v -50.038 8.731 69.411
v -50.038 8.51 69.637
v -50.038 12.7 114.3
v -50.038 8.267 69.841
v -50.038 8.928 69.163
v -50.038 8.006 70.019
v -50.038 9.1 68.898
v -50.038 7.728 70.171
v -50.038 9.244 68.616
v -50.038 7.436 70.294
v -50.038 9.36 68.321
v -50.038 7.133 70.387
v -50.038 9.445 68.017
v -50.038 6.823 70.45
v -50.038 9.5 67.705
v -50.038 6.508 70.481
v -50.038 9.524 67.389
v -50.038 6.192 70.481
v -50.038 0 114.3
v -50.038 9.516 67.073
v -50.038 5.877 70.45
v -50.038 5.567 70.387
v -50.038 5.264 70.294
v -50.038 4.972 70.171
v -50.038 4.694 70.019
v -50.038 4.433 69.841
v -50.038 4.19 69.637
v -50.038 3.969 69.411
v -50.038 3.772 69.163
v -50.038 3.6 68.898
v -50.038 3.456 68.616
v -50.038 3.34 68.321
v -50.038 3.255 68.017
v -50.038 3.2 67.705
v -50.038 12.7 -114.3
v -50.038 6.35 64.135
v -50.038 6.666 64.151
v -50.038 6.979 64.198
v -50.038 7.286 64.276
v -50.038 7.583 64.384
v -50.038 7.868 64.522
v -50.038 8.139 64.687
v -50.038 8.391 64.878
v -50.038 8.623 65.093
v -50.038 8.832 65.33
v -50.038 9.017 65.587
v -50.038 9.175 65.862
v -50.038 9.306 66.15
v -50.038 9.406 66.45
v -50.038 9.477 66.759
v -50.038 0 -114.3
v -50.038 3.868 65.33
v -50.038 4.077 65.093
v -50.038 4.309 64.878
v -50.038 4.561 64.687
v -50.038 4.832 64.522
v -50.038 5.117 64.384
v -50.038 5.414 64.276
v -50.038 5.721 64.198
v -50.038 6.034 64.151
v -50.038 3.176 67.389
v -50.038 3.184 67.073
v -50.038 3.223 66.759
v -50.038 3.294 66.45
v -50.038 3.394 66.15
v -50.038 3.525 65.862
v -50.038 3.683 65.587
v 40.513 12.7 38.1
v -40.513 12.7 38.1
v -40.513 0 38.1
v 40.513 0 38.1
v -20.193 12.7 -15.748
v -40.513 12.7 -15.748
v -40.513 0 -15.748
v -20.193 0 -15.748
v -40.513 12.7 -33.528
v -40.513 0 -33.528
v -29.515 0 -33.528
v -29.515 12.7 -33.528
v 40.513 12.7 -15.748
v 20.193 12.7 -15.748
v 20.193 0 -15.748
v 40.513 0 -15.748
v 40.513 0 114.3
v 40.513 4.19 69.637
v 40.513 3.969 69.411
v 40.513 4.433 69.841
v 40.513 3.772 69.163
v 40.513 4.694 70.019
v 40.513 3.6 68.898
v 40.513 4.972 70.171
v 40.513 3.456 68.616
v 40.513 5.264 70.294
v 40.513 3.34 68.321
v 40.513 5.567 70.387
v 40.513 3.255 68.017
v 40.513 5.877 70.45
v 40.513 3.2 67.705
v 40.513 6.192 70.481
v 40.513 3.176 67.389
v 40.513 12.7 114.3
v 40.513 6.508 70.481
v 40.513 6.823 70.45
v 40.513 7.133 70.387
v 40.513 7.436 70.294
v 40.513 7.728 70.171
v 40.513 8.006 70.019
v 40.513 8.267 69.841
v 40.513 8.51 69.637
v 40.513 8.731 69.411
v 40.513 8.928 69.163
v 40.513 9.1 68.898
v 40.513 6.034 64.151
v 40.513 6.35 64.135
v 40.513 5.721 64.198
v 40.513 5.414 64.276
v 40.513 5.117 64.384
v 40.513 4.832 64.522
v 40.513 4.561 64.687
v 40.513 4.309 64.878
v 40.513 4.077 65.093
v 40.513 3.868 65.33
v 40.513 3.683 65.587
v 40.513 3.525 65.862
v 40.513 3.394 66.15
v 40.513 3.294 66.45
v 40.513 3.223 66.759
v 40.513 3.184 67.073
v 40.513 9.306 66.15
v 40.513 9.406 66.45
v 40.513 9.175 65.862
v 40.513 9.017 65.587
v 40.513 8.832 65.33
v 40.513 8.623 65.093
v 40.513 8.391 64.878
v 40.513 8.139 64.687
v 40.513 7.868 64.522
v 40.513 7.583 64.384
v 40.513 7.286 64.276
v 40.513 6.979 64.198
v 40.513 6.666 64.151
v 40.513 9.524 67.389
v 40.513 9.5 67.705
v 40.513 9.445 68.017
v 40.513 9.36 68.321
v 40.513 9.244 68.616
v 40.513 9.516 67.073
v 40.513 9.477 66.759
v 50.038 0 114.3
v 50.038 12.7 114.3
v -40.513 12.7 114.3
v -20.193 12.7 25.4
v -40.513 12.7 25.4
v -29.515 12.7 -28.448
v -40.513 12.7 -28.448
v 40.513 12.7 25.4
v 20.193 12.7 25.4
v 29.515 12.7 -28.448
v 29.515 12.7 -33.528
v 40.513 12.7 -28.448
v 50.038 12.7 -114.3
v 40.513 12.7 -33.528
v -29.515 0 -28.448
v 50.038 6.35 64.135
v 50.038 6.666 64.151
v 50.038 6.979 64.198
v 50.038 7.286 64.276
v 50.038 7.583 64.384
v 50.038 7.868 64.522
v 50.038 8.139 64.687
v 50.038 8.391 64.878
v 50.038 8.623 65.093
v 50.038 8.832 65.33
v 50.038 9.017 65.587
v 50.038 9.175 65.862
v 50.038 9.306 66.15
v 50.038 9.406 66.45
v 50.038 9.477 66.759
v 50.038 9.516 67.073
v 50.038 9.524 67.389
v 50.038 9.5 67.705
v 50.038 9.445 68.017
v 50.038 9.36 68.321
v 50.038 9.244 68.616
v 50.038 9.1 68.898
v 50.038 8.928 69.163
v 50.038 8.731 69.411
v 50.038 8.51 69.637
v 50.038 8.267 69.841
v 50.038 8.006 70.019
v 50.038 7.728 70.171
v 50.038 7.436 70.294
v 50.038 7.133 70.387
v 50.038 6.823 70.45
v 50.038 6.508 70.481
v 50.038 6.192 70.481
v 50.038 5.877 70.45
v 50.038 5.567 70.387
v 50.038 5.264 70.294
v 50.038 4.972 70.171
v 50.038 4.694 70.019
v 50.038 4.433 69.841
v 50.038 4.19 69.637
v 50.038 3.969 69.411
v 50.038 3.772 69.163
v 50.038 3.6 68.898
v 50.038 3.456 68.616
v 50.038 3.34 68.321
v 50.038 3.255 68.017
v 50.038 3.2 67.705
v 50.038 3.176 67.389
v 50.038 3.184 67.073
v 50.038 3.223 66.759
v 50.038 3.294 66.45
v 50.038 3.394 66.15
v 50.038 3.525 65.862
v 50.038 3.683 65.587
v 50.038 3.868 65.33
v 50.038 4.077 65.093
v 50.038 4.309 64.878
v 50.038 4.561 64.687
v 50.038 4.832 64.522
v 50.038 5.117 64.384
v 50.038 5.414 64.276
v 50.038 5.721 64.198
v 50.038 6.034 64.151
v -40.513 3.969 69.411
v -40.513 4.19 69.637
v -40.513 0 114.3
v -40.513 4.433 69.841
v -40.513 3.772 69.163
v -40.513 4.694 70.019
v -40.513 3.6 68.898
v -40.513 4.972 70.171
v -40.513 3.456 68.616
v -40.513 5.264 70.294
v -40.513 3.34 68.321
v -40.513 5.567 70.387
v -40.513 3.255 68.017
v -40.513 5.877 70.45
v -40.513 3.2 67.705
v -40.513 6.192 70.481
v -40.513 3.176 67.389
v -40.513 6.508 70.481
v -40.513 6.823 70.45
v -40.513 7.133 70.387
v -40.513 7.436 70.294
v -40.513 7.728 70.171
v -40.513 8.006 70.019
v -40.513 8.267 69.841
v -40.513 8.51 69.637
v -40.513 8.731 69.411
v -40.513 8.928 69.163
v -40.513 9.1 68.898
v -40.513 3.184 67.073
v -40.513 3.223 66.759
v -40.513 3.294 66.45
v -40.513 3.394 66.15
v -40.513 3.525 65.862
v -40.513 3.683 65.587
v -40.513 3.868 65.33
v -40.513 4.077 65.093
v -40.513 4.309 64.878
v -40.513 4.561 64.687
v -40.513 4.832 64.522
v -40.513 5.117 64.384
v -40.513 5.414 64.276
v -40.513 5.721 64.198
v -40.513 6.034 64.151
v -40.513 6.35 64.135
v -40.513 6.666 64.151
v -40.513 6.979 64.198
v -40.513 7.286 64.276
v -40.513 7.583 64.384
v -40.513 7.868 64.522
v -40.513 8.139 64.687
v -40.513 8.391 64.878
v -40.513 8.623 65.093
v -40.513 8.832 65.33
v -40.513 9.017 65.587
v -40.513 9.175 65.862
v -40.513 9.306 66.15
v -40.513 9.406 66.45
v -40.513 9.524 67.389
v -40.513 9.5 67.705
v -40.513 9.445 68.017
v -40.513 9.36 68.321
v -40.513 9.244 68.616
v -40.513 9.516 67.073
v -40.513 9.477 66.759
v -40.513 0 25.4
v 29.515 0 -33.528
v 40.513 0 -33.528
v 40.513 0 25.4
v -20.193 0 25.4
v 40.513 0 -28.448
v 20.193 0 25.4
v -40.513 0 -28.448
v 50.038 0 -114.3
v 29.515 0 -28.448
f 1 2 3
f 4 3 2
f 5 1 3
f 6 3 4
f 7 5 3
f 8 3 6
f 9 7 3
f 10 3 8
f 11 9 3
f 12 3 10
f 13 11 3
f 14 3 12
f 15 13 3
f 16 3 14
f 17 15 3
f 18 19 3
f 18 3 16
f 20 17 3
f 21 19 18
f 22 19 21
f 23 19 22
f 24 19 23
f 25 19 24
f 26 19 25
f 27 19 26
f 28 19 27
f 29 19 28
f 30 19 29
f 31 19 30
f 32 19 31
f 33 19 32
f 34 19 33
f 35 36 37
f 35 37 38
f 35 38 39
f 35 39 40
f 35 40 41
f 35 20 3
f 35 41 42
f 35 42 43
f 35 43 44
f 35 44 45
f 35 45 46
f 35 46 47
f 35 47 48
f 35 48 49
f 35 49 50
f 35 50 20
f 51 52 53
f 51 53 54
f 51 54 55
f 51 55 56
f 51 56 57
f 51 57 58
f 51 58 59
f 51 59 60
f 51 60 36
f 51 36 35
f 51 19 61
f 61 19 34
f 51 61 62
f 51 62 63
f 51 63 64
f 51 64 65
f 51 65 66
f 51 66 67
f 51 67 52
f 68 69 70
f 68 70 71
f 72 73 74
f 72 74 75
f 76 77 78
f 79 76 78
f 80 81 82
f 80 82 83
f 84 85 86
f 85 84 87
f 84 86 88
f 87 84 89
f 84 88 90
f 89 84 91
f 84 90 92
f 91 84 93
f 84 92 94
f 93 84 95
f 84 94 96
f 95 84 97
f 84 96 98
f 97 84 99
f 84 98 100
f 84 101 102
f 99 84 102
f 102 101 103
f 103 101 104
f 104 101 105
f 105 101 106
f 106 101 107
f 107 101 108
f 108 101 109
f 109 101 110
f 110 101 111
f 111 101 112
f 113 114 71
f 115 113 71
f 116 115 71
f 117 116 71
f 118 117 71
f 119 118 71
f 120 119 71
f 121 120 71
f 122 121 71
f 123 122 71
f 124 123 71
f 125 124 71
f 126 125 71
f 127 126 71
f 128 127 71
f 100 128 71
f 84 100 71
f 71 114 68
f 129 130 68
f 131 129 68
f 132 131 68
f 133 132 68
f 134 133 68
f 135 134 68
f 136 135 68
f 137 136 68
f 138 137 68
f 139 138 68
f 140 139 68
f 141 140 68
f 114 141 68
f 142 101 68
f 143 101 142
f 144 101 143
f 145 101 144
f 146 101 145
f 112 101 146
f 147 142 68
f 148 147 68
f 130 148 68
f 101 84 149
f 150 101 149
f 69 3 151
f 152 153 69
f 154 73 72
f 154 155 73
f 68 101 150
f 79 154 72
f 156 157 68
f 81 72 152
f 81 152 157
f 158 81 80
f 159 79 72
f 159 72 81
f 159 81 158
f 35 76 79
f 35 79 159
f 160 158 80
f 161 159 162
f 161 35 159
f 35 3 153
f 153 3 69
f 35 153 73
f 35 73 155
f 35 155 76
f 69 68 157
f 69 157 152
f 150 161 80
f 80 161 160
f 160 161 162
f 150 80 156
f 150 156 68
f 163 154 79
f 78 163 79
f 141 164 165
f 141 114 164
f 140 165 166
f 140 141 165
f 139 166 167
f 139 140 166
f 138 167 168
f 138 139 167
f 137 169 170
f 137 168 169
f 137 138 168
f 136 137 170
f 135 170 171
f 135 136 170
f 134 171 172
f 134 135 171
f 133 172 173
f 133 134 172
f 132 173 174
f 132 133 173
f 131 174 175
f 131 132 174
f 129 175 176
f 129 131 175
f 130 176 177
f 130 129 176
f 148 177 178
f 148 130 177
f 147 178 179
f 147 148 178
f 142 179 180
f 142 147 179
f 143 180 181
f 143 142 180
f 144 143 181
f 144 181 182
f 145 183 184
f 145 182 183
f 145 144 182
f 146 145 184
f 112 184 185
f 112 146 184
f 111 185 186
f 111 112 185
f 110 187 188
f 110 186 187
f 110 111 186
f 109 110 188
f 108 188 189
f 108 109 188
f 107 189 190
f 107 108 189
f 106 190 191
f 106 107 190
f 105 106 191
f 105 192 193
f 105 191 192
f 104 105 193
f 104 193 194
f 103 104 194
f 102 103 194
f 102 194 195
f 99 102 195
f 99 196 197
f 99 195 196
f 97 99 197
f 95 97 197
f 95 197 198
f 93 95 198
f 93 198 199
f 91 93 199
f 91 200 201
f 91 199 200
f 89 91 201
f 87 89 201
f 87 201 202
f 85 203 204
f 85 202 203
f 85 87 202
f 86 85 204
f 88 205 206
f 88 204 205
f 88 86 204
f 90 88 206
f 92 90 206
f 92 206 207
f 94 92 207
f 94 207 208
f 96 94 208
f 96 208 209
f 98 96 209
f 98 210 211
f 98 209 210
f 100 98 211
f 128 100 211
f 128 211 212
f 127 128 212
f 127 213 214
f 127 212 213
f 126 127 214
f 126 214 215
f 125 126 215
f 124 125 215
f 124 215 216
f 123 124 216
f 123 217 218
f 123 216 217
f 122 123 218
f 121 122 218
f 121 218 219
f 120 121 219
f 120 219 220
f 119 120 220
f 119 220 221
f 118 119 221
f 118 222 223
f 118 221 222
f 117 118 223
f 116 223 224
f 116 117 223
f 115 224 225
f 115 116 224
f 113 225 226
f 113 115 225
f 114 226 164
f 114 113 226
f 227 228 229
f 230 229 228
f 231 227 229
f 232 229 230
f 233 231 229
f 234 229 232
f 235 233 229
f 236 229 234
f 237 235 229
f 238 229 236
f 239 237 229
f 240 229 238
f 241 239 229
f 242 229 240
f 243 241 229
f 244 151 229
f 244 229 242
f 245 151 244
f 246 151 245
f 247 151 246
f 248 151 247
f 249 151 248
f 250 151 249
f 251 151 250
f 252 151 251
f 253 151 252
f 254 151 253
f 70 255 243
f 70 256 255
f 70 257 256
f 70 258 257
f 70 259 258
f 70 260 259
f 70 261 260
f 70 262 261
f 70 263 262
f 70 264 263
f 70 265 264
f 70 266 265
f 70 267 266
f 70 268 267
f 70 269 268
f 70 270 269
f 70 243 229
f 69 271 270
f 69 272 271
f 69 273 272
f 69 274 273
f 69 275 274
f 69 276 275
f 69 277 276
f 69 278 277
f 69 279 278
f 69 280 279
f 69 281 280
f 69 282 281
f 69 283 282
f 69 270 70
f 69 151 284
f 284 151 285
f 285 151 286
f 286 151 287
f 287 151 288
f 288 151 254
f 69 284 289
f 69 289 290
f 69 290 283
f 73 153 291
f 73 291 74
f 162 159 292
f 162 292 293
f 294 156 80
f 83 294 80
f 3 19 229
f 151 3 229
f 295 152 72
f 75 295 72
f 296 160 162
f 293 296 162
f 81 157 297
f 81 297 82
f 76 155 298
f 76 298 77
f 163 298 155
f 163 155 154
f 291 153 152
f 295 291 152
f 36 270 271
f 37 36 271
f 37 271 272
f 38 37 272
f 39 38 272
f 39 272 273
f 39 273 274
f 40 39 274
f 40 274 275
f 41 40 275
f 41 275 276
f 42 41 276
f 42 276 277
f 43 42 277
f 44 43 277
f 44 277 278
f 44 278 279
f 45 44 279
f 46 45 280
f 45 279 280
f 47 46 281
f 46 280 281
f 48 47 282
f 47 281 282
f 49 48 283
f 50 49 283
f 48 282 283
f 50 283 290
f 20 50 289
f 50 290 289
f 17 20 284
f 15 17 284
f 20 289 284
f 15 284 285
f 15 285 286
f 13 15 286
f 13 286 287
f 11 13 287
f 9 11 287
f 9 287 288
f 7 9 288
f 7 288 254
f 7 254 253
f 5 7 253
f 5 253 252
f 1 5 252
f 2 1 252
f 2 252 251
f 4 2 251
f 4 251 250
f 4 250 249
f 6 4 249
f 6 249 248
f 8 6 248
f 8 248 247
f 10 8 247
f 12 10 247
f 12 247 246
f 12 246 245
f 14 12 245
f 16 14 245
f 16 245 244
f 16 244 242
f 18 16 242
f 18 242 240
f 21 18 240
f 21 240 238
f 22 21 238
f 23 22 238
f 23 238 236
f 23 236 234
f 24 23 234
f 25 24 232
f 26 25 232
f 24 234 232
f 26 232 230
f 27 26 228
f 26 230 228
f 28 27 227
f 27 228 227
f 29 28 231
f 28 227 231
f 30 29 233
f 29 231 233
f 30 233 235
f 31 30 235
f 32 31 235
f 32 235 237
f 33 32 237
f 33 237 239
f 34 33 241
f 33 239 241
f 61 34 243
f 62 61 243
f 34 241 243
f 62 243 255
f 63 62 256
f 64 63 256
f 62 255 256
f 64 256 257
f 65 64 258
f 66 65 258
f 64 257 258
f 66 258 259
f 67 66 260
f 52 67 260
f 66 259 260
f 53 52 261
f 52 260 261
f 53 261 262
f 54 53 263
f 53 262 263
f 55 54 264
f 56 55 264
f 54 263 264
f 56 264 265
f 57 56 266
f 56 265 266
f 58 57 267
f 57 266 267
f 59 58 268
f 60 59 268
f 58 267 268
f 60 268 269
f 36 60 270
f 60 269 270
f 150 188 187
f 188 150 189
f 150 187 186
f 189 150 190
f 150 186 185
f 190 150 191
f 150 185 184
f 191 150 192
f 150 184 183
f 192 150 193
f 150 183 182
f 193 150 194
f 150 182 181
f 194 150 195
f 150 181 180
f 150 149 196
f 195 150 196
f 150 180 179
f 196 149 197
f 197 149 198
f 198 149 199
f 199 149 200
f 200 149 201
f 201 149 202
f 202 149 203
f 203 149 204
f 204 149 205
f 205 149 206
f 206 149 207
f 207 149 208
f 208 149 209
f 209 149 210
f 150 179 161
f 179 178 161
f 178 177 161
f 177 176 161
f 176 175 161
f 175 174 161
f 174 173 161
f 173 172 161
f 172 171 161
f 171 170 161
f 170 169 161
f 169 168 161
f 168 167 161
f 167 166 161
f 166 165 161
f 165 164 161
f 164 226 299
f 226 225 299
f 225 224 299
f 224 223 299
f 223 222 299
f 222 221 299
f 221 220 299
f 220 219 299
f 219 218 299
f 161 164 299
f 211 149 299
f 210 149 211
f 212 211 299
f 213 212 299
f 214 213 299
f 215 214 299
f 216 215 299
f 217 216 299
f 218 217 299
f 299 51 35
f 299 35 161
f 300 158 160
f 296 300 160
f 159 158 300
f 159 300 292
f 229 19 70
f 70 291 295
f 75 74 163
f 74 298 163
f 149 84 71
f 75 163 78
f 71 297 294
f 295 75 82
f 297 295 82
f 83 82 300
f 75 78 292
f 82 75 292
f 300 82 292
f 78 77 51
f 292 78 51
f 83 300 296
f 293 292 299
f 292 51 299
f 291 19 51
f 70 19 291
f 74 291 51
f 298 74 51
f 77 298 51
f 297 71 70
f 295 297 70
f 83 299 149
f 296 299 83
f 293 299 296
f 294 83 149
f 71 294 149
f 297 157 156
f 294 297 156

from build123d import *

# Parameters (mm, degrees)
SKETCH1_W               = 100.076
SKETCH1_H               = 228.6
BOSS_EXTRUDE1_DEPTH     = 12.7
SKETCH2_W               = 81.026
SKETCH2_H               = 76.2
CUT_EXTRUDE1_DEPTH      = 13.7
SKETCH3_W               = 20.32
SKETCH3_H               = 41.148
SKETCH3_W_2             = 10.9982
SKETCH3_H_2             = 5.08
CUT_EXTRUDE2_DEPTH      = 13.7
SKETCH4_R               = 3.175
CUT_EXTRUDE3_DEPTH      = 91.551
CUT_EXTRUDE3_DEPTH_BACK = 10.525


with BuildPart() as part:
    # Sketch1 → Boss-Extrude1 (new body)
    with BuildSketch(Plane(origin=(0, 0, 0), x_dir=(1, 0, 0), z_dir=(0, 1, 0))):
        Rectangle(SKETCH1_W, SKETCH1_H)
    extrude(amount=BOSS_EXTRUDE1_DEPTH)

    # Sketch2 → Cut-Extrude1 (cut, through all)
    with BuildSketch(Plane(origin=(0, 12.7, 0), x_dir=(1, 0, 0), z_dir=(0, 1, 0))):
        with Locations((0, -76.2)):
            Rectangle(SKETCH2_W, SKETCH2_H)
    extrude(amount=-CUT_EXTRUDE1_DEPTH, mode=Mode.SUBTRACT)

    # Sketch3 → Cut-Extrude2 (cut, through all)
    with BuildSketch(Plane(origin=(0, 12.7, 0), x_dir=(1, 0, 0), z_dir=(0, 1, 0))):
        with Locations((-30.353, -4.826)):
            Rectangle(SKETCH3_W, SKETCH3_H)
        with Locations((-35.0139, 30.988)):
            Rectangle(SKETCH3_W_2, SKETCH3_H_2)
        with Locations((30.353, -4.826)):
            Rectangle(SKETCH3_W, SKETCH3_H)
        with Locations((35.0139, 30.988)):
            Rectangle(SKETCH3_W_2, SKETCH3_H_2)
    extrude(amount=-CUT_EXTRUDE2_DEPTH, mode=Mode.SUBTRACT)

    # Sketch4 → Cut-Extrude3 (cut, two sides)
    with BuildSketch(Plane(origin=(-40.513, 0, 0), x_dir=(0, 0, -1), z_dir=(1, 0, 0))) as cut_extrude3_sk:
        with Locations((-67.31, 6.35)):
            Circle(SKETCH4_R)
    extrude(amount=CUT_EXTRUDE3_DEPTH, mode=Mode.SUBTRACT)
    extrude(cut_extrude3_sk.sketch, amount=-CUT_EXTRUDE3_DEPTH_BACK, mode=Mode.SUBTRACT)


solid = part.part
